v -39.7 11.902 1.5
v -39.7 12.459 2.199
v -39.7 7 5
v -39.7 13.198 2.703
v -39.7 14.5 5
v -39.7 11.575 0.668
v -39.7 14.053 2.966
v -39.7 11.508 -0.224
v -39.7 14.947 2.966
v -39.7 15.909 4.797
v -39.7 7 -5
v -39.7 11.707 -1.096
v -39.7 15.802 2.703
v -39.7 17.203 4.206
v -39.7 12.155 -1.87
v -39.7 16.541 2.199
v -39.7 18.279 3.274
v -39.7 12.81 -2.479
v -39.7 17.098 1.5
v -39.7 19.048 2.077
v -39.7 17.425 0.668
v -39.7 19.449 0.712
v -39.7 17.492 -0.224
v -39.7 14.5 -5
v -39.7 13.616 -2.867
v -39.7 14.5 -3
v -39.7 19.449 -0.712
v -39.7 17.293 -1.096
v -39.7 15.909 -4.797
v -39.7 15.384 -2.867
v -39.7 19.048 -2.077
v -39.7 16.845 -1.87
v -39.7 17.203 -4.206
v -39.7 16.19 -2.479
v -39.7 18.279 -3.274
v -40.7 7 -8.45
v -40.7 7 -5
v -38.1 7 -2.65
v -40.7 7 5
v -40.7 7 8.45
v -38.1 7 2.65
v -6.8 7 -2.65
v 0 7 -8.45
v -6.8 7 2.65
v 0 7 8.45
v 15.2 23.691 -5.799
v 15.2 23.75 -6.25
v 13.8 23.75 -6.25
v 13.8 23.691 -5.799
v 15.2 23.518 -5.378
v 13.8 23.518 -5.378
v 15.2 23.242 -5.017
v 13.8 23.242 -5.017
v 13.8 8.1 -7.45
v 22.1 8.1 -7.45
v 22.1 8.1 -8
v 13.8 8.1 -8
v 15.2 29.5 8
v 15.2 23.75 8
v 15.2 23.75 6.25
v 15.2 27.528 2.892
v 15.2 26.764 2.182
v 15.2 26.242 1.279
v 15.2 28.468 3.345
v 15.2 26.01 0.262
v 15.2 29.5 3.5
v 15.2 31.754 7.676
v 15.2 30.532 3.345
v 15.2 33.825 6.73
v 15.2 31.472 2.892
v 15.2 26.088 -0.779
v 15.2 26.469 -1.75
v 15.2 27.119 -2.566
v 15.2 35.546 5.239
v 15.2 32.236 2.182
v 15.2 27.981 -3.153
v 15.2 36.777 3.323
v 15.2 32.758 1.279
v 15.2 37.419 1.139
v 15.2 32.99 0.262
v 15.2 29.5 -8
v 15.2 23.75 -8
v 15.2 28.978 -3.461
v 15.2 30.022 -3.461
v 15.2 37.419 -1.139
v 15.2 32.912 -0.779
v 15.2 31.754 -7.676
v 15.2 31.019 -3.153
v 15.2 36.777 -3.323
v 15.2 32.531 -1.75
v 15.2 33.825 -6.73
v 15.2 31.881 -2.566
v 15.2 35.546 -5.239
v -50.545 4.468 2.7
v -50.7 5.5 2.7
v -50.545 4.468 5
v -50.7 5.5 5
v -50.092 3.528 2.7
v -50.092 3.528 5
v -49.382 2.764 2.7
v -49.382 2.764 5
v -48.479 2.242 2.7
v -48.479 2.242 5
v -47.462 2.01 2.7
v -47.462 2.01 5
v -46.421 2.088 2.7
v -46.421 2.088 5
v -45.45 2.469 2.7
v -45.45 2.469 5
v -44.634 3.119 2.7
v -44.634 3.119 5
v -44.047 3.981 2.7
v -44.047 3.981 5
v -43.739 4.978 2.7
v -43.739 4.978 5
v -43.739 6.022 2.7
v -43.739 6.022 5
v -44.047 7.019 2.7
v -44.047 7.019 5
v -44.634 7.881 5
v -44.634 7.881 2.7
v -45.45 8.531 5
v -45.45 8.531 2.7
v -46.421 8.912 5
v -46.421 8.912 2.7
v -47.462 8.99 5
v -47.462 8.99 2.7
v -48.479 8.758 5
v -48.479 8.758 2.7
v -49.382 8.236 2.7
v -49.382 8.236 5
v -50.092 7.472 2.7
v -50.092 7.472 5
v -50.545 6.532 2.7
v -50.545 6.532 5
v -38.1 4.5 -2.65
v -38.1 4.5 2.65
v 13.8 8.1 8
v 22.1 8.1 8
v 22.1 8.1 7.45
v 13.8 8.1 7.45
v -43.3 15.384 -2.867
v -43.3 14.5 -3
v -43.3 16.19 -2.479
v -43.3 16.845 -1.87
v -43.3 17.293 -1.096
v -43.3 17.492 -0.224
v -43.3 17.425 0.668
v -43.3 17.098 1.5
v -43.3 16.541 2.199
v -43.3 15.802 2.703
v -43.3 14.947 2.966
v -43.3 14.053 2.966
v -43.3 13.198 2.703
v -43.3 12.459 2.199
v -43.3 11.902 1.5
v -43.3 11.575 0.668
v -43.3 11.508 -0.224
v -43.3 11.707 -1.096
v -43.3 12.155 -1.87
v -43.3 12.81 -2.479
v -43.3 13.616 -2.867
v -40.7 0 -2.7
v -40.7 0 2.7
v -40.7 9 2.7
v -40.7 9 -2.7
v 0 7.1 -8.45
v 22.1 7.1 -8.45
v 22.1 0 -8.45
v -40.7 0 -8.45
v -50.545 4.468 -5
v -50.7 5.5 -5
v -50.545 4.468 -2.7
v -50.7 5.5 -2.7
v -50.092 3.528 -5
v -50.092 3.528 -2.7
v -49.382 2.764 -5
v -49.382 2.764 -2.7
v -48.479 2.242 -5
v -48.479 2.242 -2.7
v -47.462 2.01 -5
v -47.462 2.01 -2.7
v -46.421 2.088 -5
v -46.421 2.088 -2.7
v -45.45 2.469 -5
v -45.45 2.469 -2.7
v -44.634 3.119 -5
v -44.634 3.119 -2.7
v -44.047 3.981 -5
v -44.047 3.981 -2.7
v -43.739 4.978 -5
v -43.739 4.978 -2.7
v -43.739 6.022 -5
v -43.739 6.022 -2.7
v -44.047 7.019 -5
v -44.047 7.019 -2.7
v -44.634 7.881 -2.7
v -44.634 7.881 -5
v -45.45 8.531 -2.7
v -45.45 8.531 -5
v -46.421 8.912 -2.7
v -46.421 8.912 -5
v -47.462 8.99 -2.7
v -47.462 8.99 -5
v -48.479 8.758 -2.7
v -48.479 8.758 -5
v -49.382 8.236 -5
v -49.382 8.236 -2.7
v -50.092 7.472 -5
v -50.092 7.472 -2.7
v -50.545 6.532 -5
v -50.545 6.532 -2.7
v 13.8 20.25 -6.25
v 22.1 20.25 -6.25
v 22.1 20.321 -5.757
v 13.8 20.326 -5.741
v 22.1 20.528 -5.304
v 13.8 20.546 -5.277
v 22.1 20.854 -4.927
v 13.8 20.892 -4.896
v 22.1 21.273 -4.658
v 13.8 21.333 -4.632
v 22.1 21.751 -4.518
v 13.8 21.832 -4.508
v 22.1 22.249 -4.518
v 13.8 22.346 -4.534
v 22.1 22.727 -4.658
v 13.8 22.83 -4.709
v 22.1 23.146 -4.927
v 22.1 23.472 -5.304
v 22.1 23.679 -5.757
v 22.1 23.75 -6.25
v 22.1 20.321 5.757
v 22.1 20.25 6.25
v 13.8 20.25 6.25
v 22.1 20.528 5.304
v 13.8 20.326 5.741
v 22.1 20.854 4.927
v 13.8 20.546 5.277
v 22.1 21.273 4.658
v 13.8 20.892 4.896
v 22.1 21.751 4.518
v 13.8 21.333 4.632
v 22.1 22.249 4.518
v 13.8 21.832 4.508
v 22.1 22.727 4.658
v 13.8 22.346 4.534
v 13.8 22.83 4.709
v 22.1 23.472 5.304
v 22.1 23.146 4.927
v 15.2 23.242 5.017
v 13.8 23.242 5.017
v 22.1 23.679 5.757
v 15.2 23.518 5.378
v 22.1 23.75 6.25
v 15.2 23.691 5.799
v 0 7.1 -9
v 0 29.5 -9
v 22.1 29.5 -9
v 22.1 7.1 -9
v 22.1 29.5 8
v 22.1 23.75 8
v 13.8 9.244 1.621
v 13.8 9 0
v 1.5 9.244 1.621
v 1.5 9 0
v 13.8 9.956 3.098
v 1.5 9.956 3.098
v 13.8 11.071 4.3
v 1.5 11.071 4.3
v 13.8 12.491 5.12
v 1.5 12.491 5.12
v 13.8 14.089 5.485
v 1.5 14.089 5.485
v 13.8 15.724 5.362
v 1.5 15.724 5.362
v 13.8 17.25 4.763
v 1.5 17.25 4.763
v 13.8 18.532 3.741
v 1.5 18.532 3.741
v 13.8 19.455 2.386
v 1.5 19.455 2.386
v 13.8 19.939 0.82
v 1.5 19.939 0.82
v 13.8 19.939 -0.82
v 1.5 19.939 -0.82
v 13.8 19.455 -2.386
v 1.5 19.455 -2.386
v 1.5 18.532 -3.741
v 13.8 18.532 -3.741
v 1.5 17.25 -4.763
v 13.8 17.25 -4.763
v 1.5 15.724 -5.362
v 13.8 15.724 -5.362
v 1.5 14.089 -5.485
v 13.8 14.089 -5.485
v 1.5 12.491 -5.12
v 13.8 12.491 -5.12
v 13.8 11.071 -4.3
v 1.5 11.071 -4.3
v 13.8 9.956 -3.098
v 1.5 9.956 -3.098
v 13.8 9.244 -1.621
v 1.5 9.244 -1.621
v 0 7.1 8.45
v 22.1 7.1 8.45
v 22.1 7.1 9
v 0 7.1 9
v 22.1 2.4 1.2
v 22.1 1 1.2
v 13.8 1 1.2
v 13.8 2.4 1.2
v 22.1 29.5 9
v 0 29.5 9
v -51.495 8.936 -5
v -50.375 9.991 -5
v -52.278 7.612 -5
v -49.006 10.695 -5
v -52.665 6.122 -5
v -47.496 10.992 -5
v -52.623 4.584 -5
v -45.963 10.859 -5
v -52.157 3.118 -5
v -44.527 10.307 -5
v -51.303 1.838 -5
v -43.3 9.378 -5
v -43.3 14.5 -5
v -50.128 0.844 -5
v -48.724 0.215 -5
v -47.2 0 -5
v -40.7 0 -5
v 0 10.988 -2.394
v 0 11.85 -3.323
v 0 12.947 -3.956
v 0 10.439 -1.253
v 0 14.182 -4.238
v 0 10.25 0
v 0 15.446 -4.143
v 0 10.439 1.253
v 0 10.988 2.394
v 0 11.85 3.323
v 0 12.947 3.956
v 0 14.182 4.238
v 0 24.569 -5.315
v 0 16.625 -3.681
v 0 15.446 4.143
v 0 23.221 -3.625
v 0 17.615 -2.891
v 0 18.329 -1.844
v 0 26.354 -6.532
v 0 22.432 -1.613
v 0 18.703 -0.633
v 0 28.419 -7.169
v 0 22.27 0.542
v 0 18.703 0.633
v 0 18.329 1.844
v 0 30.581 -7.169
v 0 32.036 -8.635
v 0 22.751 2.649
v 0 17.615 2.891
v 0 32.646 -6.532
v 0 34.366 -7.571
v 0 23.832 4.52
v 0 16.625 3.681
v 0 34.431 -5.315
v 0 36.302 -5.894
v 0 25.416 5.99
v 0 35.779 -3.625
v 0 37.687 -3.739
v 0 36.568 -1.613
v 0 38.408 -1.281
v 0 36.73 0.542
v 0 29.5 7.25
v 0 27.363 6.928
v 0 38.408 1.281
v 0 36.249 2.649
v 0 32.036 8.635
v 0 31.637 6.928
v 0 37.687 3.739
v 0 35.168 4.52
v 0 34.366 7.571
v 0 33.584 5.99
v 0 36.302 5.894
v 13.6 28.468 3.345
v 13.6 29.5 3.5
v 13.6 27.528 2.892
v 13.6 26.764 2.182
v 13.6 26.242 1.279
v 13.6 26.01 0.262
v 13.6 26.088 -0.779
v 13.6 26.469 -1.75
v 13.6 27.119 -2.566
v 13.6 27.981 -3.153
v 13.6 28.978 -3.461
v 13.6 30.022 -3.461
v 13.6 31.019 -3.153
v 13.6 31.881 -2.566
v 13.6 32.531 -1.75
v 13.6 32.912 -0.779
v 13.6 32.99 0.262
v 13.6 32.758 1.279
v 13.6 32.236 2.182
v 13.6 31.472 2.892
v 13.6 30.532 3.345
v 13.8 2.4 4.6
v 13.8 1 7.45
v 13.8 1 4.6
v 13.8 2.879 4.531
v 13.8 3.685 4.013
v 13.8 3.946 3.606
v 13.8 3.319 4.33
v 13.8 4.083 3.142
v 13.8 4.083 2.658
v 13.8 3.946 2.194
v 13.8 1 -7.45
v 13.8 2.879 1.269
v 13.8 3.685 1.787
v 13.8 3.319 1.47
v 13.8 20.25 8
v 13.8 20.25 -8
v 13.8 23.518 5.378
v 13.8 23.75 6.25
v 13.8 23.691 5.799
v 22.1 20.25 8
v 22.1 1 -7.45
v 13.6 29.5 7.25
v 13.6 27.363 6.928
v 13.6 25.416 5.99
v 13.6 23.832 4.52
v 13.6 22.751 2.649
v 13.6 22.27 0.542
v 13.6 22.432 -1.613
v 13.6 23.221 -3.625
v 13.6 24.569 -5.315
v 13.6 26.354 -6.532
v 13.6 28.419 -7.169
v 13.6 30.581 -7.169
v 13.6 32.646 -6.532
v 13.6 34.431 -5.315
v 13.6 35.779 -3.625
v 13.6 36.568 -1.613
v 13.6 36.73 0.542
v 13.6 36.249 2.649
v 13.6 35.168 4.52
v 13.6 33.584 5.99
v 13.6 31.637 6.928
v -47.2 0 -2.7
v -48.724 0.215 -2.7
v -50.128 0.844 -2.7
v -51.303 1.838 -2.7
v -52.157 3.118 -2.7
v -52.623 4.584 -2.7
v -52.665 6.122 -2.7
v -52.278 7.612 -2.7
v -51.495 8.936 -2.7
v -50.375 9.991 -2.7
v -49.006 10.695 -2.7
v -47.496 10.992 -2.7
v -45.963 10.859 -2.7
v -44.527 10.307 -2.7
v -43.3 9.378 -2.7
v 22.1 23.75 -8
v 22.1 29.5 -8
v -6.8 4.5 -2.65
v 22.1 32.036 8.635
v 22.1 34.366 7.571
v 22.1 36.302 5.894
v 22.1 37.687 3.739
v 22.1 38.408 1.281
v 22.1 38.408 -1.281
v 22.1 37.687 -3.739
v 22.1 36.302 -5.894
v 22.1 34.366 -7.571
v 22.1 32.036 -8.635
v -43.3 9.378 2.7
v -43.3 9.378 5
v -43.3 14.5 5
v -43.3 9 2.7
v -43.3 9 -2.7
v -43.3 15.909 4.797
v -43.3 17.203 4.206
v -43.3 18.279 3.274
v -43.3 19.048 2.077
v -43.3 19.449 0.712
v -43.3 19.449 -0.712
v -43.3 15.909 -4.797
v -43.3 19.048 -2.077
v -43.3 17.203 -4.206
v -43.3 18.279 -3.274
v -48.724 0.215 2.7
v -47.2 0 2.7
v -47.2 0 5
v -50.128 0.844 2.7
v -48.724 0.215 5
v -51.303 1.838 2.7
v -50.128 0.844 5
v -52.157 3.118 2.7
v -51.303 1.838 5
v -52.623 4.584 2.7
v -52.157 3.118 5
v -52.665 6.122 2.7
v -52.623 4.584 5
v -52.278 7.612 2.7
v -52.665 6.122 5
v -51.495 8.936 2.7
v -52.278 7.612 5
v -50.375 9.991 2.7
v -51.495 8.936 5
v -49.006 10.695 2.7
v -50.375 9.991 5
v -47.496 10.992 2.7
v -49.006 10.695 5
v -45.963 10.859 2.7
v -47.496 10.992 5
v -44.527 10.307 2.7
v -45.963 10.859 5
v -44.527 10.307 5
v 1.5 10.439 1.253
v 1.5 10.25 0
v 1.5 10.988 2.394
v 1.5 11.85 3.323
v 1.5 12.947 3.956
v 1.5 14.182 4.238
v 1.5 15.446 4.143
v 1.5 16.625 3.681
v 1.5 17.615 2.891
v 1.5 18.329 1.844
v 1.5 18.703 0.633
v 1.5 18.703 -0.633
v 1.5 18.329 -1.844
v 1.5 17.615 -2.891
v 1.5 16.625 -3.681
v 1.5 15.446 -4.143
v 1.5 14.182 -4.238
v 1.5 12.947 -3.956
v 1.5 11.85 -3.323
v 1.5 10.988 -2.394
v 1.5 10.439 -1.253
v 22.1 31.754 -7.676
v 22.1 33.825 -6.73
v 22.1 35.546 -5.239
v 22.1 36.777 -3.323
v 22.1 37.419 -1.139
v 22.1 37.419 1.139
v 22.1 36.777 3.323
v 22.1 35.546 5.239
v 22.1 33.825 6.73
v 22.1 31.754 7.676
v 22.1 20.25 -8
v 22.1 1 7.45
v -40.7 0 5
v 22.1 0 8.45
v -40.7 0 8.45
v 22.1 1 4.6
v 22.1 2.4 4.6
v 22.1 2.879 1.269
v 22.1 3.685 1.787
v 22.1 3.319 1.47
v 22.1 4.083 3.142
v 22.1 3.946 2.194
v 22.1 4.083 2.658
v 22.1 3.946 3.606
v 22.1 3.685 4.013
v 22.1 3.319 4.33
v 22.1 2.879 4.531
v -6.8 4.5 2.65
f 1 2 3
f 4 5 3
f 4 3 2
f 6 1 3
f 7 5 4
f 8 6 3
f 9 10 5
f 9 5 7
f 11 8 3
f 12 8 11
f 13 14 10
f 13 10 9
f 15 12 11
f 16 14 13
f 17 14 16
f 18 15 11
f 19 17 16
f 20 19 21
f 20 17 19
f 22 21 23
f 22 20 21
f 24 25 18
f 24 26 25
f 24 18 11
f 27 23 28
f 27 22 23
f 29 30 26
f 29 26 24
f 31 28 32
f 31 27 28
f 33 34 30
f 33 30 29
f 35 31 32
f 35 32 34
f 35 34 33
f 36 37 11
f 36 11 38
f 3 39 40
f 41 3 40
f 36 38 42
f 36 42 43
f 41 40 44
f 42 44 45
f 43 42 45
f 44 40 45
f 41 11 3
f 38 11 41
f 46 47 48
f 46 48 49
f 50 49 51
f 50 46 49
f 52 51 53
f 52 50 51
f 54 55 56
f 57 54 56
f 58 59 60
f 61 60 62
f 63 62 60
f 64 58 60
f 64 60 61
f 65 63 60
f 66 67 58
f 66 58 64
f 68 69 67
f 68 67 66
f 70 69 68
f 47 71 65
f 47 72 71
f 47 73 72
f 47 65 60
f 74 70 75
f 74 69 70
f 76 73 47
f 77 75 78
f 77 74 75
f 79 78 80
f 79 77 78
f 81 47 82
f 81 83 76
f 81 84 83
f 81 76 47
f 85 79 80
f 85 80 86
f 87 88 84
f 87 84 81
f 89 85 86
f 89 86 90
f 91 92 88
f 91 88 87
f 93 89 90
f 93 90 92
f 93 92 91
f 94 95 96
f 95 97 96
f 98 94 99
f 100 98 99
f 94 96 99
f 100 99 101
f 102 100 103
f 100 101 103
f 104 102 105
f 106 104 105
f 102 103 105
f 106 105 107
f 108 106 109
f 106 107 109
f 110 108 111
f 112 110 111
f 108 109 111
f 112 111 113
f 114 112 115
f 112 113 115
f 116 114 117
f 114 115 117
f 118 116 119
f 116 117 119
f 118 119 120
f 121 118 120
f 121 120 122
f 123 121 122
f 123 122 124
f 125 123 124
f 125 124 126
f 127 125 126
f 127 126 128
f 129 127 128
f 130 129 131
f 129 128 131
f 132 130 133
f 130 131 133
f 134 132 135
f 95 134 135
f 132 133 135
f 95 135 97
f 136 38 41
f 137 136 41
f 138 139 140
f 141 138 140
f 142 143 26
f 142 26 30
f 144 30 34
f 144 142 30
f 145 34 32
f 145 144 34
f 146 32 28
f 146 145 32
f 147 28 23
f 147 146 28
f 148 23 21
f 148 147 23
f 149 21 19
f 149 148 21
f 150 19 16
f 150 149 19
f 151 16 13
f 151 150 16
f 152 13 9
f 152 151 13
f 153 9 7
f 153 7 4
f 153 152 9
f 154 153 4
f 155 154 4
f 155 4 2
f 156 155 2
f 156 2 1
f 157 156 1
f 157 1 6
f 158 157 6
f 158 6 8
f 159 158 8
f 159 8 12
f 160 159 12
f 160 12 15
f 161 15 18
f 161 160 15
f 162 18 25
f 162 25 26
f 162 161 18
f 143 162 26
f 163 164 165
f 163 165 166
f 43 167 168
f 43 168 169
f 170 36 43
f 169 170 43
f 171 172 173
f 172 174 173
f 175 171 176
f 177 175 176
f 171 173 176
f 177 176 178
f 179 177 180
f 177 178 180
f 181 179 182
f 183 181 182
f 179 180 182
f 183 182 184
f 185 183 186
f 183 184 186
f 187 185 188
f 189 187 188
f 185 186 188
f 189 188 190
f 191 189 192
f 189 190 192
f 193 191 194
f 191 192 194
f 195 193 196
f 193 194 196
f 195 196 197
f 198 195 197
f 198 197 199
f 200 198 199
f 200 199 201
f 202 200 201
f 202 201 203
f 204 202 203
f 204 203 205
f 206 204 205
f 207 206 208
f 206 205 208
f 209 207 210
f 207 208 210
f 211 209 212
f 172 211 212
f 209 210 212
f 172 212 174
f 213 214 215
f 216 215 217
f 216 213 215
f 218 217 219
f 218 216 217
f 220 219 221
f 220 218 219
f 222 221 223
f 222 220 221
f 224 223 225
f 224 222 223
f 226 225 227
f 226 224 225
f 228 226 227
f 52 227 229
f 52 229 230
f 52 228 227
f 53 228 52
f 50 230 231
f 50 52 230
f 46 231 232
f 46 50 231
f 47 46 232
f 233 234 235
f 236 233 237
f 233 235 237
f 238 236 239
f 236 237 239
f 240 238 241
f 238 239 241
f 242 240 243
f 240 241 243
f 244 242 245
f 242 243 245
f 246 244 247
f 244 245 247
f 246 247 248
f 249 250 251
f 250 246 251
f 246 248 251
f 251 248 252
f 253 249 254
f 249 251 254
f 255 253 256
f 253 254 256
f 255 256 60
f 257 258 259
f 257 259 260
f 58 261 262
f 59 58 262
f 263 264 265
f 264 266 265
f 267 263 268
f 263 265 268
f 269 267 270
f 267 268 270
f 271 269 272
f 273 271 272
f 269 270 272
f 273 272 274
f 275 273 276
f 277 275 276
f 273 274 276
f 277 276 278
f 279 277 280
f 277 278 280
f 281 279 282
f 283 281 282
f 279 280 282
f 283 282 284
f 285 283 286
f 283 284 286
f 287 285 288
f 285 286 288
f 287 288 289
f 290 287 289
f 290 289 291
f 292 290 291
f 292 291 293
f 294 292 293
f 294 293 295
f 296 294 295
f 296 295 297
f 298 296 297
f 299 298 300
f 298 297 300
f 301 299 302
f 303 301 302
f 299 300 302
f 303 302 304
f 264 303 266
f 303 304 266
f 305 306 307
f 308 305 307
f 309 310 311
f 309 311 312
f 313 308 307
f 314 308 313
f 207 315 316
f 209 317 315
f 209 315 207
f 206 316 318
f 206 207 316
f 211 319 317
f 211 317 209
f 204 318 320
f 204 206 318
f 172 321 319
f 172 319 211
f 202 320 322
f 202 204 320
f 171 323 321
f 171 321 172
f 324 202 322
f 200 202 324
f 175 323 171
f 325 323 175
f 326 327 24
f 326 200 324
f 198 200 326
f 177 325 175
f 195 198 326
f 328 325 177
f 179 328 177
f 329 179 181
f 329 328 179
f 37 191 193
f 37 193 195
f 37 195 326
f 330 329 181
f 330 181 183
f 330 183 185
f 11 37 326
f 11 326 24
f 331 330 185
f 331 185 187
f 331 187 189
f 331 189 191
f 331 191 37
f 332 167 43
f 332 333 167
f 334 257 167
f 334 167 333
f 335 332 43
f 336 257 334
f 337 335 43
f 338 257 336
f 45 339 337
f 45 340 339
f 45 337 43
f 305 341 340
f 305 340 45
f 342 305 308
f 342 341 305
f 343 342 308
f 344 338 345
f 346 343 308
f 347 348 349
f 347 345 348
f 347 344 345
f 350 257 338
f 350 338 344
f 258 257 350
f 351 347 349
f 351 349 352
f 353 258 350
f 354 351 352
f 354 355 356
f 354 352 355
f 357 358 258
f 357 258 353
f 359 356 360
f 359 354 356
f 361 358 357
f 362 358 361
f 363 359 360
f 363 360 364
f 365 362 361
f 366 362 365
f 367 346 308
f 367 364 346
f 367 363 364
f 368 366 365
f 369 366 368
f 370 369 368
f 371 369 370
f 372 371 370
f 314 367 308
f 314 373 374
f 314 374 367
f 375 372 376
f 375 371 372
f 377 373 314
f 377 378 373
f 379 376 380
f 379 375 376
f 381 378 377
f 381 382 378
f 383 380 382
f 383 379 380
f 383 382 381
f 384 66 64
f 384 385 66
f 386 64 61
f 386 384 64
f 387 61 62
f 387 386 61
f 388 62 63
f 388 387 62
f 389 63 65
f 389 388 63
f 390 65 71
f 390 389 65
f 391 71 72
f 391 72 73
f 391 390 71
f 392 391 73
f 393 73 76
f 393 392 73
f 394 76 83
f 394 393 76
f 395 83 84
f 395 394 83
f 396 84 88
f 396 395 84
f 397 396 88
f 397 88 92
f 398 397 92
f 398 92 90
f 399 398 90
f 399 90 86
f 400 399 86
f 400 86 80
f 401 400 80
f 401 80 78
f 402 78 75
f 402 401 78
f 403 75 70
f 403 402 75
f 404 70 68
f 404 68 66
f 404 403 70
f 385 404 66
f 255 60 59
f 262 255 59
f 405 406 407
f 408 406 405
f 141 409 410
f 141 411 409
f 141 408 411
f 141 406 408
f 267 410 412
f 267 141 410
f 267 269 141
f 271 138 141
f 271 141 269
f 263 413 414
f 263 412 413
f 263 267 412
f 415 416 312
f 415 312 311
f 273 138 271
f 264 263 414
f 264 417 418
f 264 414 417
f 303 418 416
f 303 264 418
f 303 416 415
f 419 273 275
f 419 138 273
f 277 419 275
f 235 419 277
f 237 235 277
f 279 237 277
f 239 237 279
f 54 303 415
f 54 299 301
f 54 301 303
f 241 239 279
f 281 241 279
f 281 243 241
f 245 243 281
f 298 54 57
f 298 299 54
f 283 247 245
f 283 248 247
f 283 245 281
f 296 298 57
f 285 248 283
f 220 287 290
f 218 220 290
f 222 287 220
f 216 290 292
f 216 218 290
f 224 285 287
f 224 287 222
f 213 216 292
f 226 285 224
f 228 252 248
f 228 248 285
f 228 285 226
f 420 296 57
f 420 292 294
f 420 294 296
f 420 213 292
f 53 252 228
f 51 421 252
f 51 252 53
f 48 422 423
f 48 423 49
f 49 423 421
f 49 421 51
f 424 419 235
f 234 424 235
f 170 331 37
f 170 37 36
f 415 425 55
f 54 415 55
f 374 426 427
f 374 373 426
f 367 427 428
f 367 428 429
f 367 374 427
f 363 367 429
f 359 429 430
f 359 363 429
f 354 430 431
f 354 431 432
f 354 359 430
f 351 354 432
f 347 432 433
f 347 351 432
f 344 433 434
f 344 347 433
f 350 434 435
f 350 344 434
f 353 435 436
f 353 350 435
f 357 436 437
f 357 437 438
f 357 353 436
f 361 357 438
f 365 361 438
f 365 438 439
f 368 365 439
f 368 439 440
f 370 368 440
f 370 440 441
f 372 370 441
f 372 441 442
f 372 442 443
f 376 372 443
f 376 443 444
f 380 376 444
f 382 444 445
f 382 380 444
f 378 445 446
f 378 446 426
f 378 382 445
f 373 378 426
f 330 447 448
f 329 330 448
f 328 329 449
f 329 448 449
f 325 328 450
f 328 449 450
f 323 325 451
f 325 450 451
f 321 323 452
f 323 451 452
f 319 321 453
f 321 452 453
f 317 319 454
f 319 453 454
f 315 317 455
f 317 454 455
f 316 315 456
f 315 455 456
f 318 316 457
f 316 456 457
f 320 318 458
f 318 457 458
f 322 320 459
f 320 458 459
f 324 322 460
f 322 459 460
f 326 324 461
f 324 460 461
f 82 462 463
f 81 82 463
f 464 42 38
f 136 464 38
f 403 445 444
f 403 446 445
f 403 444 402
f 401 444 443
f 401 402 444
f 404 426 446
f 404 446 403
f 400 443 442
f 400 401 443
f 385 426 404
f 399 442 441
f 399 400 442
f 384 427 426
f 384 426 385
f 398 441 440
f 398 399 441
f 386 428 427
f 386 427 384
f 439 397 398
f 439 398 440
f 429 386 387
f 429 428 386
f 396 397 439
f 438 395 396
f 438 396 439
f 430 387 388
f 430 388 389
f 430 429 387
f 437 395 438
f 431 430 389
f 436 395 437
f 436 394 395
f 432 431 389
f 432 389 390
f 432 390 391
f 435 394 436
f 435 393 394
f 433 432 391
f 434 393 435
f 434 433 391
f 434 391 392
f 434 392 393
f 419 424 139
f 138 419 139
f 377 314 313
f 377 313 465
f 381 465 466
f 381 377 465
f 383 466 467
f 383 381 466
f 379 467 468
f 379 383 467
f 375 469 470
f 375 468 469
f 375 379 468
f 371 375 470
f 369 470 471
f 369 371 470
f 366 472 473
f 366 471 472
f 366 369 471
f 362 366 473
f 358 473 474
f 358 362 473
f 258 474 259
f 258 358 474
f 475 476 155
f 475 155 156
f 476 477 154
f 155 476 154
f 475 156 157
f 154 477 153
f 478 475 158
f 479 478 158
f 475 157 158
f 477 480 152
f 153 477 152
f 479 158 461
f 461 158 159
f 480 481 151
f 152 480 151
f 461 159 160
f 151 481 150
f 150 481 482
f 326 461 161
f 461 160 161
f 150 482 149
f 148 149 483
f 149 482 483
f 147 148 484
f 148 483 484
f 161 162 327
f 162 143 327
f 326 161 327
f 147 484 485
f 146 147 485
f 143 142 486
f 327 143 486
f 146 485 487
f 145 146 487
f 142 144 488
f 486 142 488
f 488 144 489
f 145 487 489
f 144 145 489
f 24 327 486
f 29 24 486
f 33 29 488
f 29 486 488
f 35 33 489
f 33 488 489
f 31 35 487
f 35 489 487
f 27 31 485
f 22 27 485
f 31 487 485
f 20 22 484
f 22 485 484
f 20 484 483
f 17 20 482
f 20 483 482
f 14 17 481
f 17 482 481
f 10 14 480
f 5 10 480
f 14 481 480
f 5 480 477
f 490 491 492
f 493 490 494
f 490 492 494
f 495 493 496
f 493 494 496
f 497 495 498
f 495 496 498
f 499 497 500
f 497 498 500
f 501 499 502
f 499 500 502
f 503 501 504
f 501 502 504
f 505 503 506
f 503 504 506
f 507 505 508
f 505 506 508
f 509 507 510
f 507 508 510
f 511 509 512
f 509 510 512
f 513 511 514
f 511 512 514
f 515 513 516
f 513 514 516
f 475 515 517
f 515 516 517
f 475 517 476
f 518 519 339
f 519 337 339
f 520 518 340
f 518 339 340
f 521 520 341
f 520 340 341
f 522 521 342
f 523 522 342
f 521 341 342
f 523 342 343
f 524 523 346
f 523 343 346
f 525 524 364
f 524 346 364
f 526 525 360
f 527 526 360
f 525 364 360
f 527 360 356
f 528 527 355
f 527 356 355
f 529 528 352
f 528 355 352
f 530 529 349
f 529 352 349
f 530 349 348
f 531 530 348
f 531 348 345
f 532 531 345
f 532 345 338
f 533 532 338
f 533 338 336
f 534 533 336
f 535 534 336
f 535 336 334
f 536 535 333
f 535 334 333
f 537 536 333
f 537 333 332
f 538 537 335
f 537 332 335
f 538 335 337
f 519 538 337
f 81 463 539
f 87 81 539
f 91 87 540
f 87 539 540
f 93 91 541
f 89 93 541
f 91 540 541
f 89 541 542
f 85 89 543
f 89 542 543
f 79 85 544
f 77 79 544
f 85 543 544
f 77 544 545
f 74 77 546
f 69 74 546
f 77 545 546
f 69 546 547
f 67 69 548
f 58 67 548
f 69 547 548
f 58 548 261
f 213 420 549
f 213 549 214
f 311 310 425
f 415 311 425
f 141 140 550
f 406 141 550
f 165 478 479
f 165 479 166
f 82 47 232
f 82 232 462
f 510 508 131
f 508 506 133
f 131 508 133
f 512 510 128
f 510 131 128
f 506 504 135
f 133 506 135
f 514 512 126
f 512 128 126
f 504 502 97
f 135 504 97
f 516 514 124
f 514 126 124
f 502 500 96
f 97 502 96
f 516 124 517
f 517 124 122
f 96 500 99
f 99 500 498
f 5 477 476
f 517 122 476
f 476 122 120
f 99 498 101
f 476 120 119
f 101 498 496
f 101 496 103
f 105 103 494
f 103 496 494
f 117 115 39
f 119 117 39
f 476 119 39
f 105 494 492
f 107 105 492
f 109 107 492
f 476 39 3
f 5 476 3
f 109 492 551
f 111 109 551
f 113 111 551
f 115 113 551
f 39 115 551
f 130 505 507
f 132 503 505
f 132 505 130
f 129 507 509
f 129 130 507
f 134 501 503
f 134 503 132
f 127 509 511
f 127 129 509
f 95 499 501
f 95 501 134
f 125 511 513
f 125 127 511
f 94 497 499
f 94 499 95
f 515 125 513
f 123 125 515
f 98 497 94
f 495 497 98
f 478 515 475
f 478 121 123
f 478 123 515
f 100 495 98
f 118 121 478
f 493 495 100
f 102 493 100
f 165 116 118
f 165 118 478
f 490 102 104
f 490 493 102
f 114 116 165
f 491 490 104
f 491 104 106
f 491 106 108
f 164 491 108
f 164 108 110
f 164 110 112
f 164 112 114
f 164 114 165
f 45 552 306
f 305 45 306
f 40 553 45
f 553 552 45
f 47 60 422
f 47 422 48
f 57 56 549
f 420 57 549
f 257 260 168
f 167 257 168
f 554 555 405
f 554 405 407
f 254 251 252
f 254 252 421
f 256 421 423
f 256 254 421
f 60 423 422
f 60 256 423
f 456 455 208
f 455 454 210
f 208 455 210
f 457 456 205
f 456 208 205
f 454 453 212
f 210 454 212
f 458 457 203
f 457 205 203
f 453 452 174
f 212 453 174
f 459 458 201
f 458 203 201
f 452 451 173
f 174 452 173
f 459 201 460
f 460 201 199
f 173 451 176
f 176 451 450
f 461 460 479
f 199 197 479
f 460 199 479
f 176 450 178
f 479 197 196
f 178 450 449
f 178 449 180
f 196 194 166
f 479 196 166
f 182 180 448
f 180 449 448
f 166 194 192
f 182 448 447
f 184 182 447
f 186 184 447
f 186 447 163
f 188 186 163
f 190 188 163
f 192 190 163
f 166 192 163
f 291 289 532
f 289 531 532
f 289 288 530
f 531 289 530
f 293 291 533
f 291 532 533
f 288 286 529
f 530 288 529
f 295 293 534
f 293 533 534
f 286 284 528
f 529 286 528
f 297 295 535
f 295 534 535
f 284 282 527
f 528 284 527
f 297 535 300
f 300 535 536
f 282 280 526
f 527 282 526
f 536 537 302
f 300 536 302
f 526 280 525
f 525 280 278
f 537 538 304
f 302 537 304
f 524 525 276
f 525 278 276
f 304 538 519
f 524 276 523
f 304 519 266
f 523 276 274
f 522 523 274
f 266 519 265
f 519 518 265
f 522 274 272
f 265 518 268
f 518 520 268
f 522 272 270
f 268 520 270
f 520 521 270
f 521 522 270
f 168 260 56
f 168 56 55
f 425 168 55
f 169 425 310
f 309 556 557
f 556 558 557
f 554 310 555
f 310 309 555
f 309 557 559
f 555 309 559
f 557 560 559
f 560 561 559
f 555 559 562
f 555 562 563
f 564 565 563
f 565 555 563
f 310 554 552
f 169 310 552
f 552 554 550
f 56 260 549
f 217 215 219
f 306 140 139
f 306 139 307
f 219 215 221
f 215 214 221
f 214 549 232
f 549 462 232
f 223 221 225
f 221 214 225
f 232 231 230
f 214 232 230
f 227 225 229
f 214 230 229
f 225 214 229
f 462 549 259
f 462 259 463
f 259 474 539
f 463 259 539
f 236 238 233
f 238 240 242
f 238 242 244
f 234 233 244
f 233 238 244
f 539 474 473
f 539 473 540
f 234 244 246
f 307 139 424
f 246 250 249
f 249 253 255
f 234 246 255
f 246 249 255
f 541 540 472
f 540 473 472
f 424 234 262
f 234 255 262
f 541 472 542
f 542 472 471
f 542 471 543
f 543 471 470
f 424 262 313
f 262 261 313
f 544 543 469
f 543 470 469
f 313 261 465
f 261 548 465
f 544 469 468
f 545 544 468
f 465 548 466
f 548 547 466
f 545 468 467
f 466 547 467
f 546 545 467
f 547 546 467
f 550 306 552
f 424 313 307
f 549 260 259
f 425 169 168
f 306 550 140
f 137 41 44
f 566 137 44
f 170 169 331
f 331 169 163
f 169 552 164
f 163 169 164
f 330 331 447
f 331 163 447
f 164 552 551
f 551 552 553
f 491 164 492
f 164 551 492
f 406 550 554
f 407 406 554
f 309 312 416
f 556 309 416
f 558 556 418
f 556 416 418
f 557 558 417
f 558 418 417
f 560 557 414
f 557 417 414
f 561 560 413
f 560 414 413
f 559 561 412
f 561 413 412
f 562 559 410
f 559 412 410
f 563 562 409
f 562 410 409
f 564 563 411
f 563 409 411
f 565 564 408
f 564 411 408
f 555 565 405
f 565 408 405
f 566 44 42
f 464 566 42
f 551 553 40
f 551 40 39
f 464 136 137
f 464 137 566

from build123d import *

# Parameters (mm, degrees)
BOSS_EXTRUDE18_DEPTH            = 24.1
CUT_EXTRUDE24_DEPTH             = 10.3
CUT_EXTRUDE25_DEPTH             = 8.9
BOSS_EXTRUDE7_DEPTH             = 9.3
CUT_EXTRUDE21_START             = -2
CUT_EXTRUDE21_DEPTH             = 2
BOSS_EXTRUDE2_REACH             = 48.304
SKETCH16_W                      = 40.7
SKETCH16_H                      = 7
BOSS_EXTRUDE2_DIRECTION_2_REACH = 48.304
BOSS_EXTRUDE3_REACH             = 58.743
SKETCH23_R                      = 3.5
BOSS_EXTRUDE3_DIRECTION_2_REACH = 58.743
SKETCH24_W                      = 12
SKETCH24_H                      = 5.4
SKETCH24_H_2                    = 3.45
CUT_EXTRUDE6_DEPTH              = 66.882774684
BOSS_EXTRUDE4_DEPTH             = 1
BOSS_EXTRUDE4_DEPTH_BACK        = 2.6
SKETCH28_R                      = 3
SKETCH33_W                      = 2.6
SKETCH33_H                      = 4
CUT_EXTRUDE10_DEPTH             = 5.4
CUT_EXTRUDE12_DEPTH             = 2.5
DELETEFACE7_START               = 23.1
DELETEFACE7_DEPTH               = 1
CUT_EXTRUDE29_START             = -1
SKETCH105_R                     = 1.7
CUT_EXTRUDE29_DEPTH             = 1
SKETCH106_W                     = 18
SKETCH106_H                     = 31.4
CUT_EXTRUDE30_DEPTH             = 2
CUT_EXTRUDE31_DEPTH             = 1.4


# Read off the part's stored shape, not the designer's step: DeleteFace7
with BuildPart() as part:
    # Sketch95 → Boss-Extrude18 (new body)
    with BuildSketch(Plane(origin=(0, 0, 0), x_dir=(0, 0, -1), z_dir=(1, 0, 0))):
        with BuildLine():
            Line((9, 29.5), (9, 7.1))
            Line((9, 7.1), (8.45, 7.1))
            Line((8.45, 7.1), (8.45, 0))
            Line((8.45, 0), (-8.45, 0))
            Line((-8.45, 0), (-8.45, 7.1))
            Line((-8.45, 7.1), (-9, 7.1))
            Line((-9, 7.1), (-9, 29.5))
            ThreePointArc((-9, 29.5), (0, 38.5), (9, 29.5))
        make_face()
    extrude(amount=BOSS_EXTRUDE18_DEPTH)

    # Sketch96 → Cut-Extrude24 (cut)
    with BuildSketch(Plane(origin=(24.1, 0, 0), x_dir=(0, 0, -1), z_dir=(1, 0, 0))):
        with BuildLine():
            Line((-7.45, 8.1), (-7.45, 1))
            Line((-7.45, 1), (7.45, 1))
            Line((7.45, 1), (7.45, 8.1))
            Line((7.45, 8.1), (8, 8.1))
            Line((8, 8.1), (8, 21.5))
            ThreePointArc((8, 21.5), (6.894427191, 23.288854382), (4.8, 23.1))
            ThreePointArc((4.8, 23.1), (0, 21.5), (-4.8, 23.1))
            ThreePointArc((-4.8, 23.1), (-6.894427191, 23.288854382), (-8, 21.5))
            Line((-8, 21.5), (-8, 8.1))
            Line((-8, 8.1), (-7.45, 8.1))
        make_face()
    extrude(amount=-CUT_EXTRUDE24_DEPTH, mode=Mode.SUBTRACT)

    # Sketch97 → Cut-Extrude25 (cut)
    with BuildSketch(Plane(origin=(24.1, 0, 0), x_dir=(0, 0, -1), z_dir=(1, 0, 0))):
        with BuildLine():
            Line((-8, 29.5), (-8, 21.5))
            Line((-8, 21.5), (8, 21.5))
            Line((8, 21.5), (8, 29.5))
            ThreePointArc((8, 29.5), (0, 37.5), (-8, 29.5))
        make_face()
    extrude(amount=-CUT_EXTRUDE25_DEPTH, mode=Mode.SUBTRACT)

    # Sketch11 → Cut-Revolve1 (revolve, cut)
    with BuildSketch(Plane.XY):
        Polygon((13.8, 14.5), (13.8, 9), (1.5, 9), (1.5, 10.25), (0, 10.25), (0, 14.5), align=None)
    revolve(axis=Axis((19.869277651, 14.5, 0), (-1, 0, 0)), mode=Mode.SUBTRACT)

    # Sketch12 → Cut-Revolve2 (revolve, cut)
    with BuildSketch(Plane.XY, mode=Mode.PRIVATE) as cut_revolve2_sk:
        Polygon((15.2, 29.5), (15.2, 26), (13.6, 26), (13.6, 22.25), (0, 22.25), (0, 29.5), align=None)
    revolve(cut_revolve2_sk.sketch.rotate(Axis((8.225974271, 29.5, 0), (1, 0, 0)), 270), axis=Axis((8.225974271, 29.5, 0), (1, 0, 0)), mode=Mode.SUBTRACT)

    # Sketch69 → Boss-Extrude7 (add)
    with BuildSketch(Plane(origin=(13.8, 0, 0), x_dir=(0, 0, -1), z_dir=(1, 0, 0))):
        with BuildLine():
            Line((8, 23.75), (8, 20.25))
            Line((8, 20.25), (6.25, 20.25))
            ThreePointArc((6.25, 20.25), (4.5, 22), (6.25, 23.75))
            Line((6.25, 23.75), (8, 23.75))
        make_face()
        with BuildLine():
            Line((-8, 23.75), (-8, 20.25))
            Line((-8, 20.25), (-6.25, 20.25))
            ThreePointArc((-6.25, 20.25), (-4.5, 22), (-6.25, 23.75))
            Line((-6.25, 23.75), (-8, 23.75))
        make_face()
        with BuildLine():
            Line((-4.6, 2.4), (-4.6, 1))
            Line((-4.6, 1), (-1.2, 1))
            Line((-1.2, 1), (-1.2, 2.4))
            ThreePointArc((-1.2, 2.4), (-2.9, 4.1), (-4.6, 2.4))
        make_face()
    extrude(amount=BOSS_EXTRUDE7_DEPTH)

    # Sketch80 → Cut-Extrude21 (cut)
    with BuildSketch(Plane(origin=(24.1, 0, 0), x_dir=(0, 0, -1), z_dir=(1, 0, 0)).offset(CUT_EXTRUDE21_START)):
        with BuildLine():
            Line((-7.45, 0), (-9, 0))
            Line((-9, 0), (-9, 8.1))
            Line((-9, 8.1), (-7.45, 8.1))
            Line((-7.45, 8.1), (-7.45, 2.4))
            Line((-7.45, 2.4), (-4.6, 2.4))
            ThreePointArc((-4.6, 2.4), (-2.9, 0.7), (-1.2, 2.4))
            Line((-1.2, 2.4), (7.45, 2.4))
            Line((7.45, 2.4), (7.45, 8.1))
            Line((7.45, 8.1), (9, 8.1))
            Line((9, 8.1), (9, 0))
            Line((9, 0), (7.45, 0))
            Line((7.45, 0), (-7.45, 0))
        make_face()
    extrude(amount=CUT_EXTRUDE21_DEPTH, mode=Mode.SUBTRACT)

    # Boss-Extrude2: up to this face of the body (flat: up to its plane)
    boss_extrude2_end = Plane(part.part.faces().sort_by_distance((11.05, 3.55, 8.45))[0])
    # Sketch16 → Boss-Extrude2 (add, up to the picked face)
    with BuildSketch(Plane.XY, mode=Mode.PRIVATE) as boss_extrude2_sk1:
        with Locations((-20.35, 3.5)):
            Rectangle(SKETCH16_W, SKETCH16_H)
    boss_extrude2_tool1 = split(extrude(boss_extrude2_sk1.sketch, amount=BOSS_EXTRUDE2_REACH, mode=Mode.PRIVATE), bisect_by=boss_extrude2_end, keep=Keep.BOTH, mode=Mode.PRIVATE)
    add(boss_extrude2_tool1.solids().sort_by(Axis((-20.35, 3.5, 0), (0, 0, 1)))[0])

    # Boss-Extrude2 direction 2: up to this face of the body (flat: up to its plane)
    boss_extrude2_direction_2_end = Plane(part.part.faces().sort_by_distance((11.05, 3.55, -8.45))[0])
    # Sketch16 → Boss-Extrude2 direction 2 (add, up to the picked face)
    with BuildSketch(Plane.XY, mode=Mode.PRIVATE) as boss_extrude2_direction_2_sk1:
        with Locations((-20.35, 3.5)):
            Rectangle(SKETCH16_W, SKETCH16_H)
    boss_extrude2_direction_2_tool1 = split(extrude(boss_extrude2_direction_2_sk1.sketch, amount=-BOSS_EXTRUDE2_DIRECTION_2_REACH, mode=Mode.PRIVATE), bisect_by=boss_extrude2_direction_2_end, keep=Keep.BOTH, mode=Mode.PRIVATE)
    add(boss_extrude2_direction_2_tool1.solids().sort_by(Axis((-20.35, 3.5, 0), (0, 0, -1)))[0])

    # Boss-Extrude3: up to this face of the body (flat: up to its plane)
    boss_extrude3_end = Plane(part.part.faces().sort_by_distance((-9.198206243, 3.517757633, 8.45))[0])
    # Sketch23 → Boss-Extrude3 (add, up to the picked face)
    with BuildSketch(Plane.XY, mode=Mode.PRIVATE) as boss_extrude3_sk1:
        with BuildLine():
            Line((-41.908497378, 7), (-40.7, 7))
            Line((-40.7, 7), (-40.7, 0))
            Line((-40.7, 0), (-47.2, 0))
            ThreePointArc((-47.2, 0), (-51.587482194, 8.81662479), (-41.908497378, 7))
        make_face()
        with Locations(Location((-47.2, 5.5, 0), (0, 0, 180))):
            Circle(SKETCH23_R, mode=Mode.SUBTRACT)
    boss_extrude3_tool1 = split(extrude(boss_extrude3_sk1.sketch, amount=BOSS_EXTRUDE3_REACH, mode=Mode.PRIVATE), bisect_by=boss_extrude3_end, keep=Keep.BOTH, mode=Mode.PRIVATE)
    add(boss_extrude3_tool1.solids().sort_by(Axis((-41.304249, 6.837212, 0), (0, 0, 1)))[0])

    # Boss-Extrude3 direction 2: up to this face of the body (flat: up to its plane)
    boss_extrude3_direction_2_end = Plane(part.part.faces().sort_by_distance((-9.198206243, 3.517757633, -8.45))[0])
    # Sketch23 → Boss-Extrude3 direction 2 (add, up to the picked face)
    with BuildSketch(Plane.XY, mode=Mode.PRIVATE) as boss_extrude3_direction_2_sk1:
        with BuildLine():
            Line((-41.908497378, 7), (-40.7, 7))
            Line((-40.7, 7), (-40.7, 0))
            Line((-40.7, 0), (-47.2, 0))
            ThreePointArc((-47.2, 0), (-51.587482194, 8.81662479), (-41.908497378, 7))
        make_face()
        with Locations(Location((-47.2, 5.5, 0), (0, 0, 180))):
            Circle(SKETCH23_R, mode=Mode.SUBTRACT)
    boss_extrude3_direction_2_tool1 = split(extrude(boss_extrude3_direction_2_sk1.sketch, amount=-BOSS_EXTRUDE3_DIRECTION_2_REACH, mode=Mode.PRIVATE), bisect_by=boss_extrude3_direction_2_end, keep=Keep.BOTH, mode=Mode.PRIVATE)
    add(boss_extrude3_direction_2_tool1.solids().sort_by(Axis((-41.304249, 6.837212, 0), (0, 0, -1)))[0])

    # Sketch24 → Cut-Extrude6 (cut, through all)
    with BuildSketch(Plane(origin=(0, 0, 0), x_dir=(1, 0, 0), z_dir=(0, 1, 0))):
        with Locations((-46.7, 0)):
            Rectangle(SKETCH24_W, SKETCH24_H)
        with Locations((-46.7, -6.725)):
            Rectangle(SKETCH24_W, SKETCH24_H_2)
        with Locations((-46.7, 6.725)):
            Rectangle(SKETCH24_W, SKETCH24_H_2)
    extrude(amount=CUT_EXTRUDE6_DEPTH, mode=Mode.SUBTRACT)

    # Sketch28 → Boss-Extrude4 (add, two sides: drawn at the far end of the back side and taken through both)
    with BuildSketch(Plane(origin=(-40.7, 0, 0), x_dir=(0, 0, -1), z_dir=(1, 0, 0)).offset(-BOSS_EXTRUDE4_DEPTH_BACK)):
        with BuildLine():
            Line((-5, 7), (5, 7))
            Line((5, 7), (5, 14.5))
            ThreePointArc((5, 14.5), (0, 19.5), (-5, 14.5))
            Line((-5, 14.5), (-5, 7))
        make_face()
        with Locations((0, 14.5)):
            Circle(SKETCH28_R, mode=Mode.SUBTRACT)
    extrude(amount=BOSS_EXTRUDE4_DEPTH + BOSS_EXTRUDE4_DEPTH_BACK)

    # Sketch33 → Cut-Extrude10 (cut)
    with BuildSketch(Plane.XY.offset(-2.7)):
        with Locations((-42, 7)):
            Rectangle(SKETCH33_W, SKETCH33_H)
    extrude(amount=CUT_EXTRUDE10_DEPTH, mode=Mode.SUBTRACT)

    # Sketch35 → Cut-Extrude12 (cut)
    with BuildSketch(Plane(origin=(0, 7, 0), x_dir=(1, 0, 0), z_dir=(0, 1, 0))):
        Polygon((-36.6, 2.65), (-38.1, 2.65), (-38.1, -2.65), (-36.6, -2.65), (-8.3, -2.65), (-6.8, -2.65), (-6.8, 2.65), (-8.3, 2.65), align=None)
    extrude(amount=-CUT_EXTRUDE12_DEPTH, mode=Mode.SUBTRACT)

    # DeleteFace7 outline → DeleteFace7 (cut)
    with BuildSketch(Plane.YZ.offset(DELETEFACE7_START)):
        with BuildLine():
            Line((1, 1.935634924), (1, 3.864365076))
            ThreePointArc((1, 3.864365076), (0.7, 2.9), (1, 1.935634924))
        make_face()
    extrude(amount=DELETEFACE7_DEPTH, mode=Mode.SUBTRACT)

    # Sketch105 → Cut-Extrude29 (cut)
    with BuildSketch(Plane(origin=(23.1, 0, 0), x_dir=(0, 0, -1), z_dir=(1, 0, 0)).offset(CUT_EXTRUDE29_START)):
        with Locations((-2.9, 2.4)):
            Circle(SKETCH105_R)
    extrude(amount=CUT_EXTRUDE29_DEPTH, mode=Mode.SUBTRACT)

    # Sketch106 → Cut-Extrude30 (cut)
    with BuildSketch(Plane(origin=(24.1, 0, 0), x_dir=(0, 0, -1), z_dir=(1, 0, 0))):
        with Locations((0, 22.8)):
            Rectangle(SKETCH106_W, SKETCH106_H)
    extrude(amount=-CUT_EXTRUDE30_DEPTH, mode=Mode.SUBTRACT)

    # Sketch107 → Cut-Extrude31 (cut)
    with BuildSketch(Plane(origin=(15.2, 0, 0), x_dir=(0, 0, -1), z_dir=(1, 0, 0))):
        with BuildLine():
            Line((-6.25, 23.75), (6.25, 23.75))
            ThreePointArc((6.25, 23.75), (5.583042256, 23.617920693), (5.016760303, 23.241619849))
            ThreePointArc((5.016760303, 23.241619849), (4.906085954, 23.174321373), (4.8, 23.1))
            ThreePointArc((4.8, 23.1), (0, 21.5), (-4.8, 23.1))
            ThreePointArc((-4.8, 23.1), (-4.906085954, 23.174321373), (-5.016760303, 23.241619849))
            ThreePointArc((-5.016760303, 23.241619849), (-5.583042256, 23.617920693), (-6.25, 23.75))
        make_face()
    extrude(amount=-CUT_EXTRUDE31_DEPTH, mode=Mode.SUBTRACT)


solid = part.part
